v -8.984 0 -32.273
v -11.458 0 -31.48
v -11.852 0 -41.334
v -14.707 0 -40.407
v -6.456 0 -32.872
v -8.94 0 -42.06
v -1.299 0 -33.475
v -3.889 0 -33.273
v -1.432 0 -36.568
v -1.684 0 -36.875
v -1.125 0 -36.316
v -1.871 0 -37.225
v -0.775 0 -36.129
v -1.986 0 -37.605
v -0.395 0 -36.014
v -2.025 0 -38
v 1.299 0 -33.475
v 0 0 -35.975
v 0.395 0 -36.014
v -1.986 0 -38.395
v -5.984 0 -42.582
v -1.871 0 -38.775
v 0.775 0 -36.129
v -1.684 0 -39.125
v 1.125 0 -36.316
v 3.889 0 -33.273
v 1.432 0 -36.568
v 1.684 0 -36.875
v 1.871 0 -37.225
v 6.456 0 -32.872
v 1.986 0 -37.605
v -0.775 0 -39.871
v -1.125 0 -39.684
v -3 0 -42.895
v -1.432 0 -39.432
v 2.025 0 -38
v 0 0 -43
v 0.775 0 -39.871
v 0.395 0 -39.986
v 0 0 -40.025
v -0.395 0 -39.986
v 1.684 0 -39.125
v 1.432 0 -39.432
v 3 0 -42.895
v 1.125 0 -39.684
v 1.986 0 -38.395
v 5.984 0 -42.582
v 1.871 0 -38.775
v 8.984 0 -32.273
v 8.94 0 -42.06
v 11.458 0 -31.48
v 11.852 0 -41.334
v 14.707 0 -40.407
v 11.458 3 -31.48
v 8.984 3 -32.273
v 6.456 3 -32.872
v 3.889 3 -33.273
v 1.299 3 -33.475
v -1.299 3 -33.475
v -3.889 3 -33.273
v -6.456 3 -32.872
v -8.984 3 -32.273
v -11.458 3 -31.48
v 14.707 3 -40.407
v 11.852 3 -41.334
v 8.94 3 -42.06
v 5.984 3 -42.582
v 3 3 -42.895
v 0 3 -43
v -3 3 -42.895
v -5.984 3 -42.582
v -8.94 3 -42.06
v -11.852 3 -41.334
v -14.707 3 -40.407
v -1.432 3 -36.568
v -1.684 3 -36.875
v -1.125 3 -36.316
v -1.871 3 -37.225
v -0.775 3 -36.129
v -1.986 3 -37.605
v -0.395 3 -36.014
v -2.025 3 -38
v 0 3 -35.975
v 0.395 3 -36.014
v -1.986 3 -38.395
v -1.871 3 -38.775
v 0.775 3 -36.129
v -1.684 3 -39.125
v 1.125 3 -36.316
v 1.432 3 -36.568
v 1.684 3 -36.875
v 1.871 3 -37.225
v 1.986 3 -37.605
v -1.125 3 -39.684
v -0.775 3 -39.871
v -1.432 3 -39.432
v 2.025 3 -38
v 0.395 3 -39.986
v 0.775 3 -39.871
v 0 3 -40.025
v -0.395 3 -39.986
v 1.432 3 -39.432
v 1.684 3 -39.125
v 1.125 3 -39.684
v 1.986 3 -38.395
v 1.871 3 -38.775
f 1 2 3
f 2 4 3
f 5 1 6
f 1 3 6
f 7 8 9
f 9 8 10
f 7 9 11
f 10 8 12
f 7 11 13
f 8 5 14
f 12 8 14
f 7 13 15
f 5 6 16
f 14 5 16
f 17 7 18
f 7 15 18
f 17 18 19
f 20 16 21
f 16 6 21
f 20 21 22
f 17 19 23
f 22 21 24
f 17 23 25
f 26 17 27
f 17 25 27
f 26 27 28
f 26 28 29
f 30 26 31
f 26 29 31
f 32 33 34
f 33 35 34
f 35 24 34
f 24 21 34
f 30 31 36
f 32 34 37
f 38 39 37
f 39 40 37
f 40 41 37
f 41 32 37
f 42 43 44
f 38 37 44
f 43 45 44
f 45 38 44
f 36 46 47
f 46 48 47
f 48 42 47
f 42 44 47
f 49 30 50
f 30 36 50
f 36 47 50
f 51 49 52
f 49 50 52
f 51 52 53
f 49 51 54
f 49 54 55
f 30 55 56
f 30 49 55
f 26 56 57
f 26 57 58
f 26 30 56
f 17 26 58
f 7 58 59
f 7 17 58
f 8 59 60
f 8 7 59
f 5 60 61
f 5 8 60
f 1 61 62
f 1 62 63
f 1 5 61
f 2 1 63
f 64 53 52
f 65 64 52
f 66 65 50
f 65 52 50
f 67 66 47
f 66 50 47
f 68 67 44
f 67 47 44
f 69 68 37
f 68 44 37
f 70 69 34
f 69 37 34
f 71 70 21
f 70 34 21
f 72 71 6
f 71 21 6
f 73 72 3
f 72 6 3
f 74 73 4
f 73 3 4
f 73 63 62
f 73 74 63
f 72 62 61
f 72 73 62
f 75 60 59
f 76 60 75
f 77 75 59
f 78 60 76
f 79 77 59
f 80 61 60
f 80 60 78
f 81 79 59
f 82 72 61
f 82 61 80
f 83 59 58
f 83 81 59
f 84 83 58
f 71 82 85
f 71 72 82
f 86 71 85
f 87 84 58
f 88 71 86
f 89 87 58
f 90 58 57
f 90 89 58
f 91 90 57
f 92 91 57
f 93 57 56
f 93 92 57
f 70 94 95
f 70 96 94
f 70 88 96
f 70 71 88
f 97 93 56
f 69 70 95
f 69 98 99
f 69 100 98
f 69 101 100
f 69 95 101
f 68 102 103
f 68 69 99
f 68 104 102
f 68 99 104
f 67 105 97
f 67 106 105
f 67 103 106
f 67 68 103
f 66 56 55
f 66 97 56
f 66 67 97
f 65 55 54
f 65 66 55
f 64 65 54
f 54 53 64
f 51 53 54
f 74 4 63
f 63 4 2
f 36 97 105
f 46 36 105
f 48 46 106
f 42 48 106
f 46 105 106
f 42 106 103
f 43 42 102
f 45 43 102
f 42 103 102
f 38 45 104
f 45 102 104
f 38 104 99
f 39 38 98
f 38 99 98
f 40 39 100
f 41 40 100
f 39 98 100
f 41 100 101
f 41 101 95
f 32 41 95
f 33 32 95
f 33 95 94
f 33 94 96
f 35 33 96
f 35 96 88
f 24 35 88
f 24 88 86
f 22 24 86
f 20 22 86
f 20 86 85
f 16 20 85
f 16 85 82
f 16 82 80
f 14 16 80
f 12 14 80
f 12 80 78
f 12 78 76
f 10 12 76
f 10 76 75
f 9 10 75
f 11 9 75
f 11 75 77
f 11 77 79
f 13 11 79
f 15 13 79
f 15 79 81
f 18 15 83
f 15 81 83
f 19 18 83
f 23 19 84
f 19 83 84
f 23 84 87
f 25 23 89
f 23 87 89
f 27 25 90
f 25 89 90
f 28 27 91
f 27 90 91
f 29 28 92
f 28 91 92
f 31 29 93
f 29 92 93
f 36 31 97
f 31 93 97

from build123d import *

# Parameters (mm, degrees)
SKETCH1_R               = 43
SKETCH1_R_2             = 33.5
BOSS_EXTRUDE1_DEPTH     = 3
CUT_EXTRUDE1_START      = -4
CUT_EXTRUDE1_DEPTH      = 5
SKETCH3_R               = 2.025
CUT_EXTRUDE2_DEPTH      = 1
CUT_EXTRUDE2_DEPTH_BACK = 4


with BuildPart() as part:
    # Sketch1 → Boss-Extrude1 (new body)
    with BuildSketch(Plane(origin=(0, 0, 0), x_dir=(1, 0, 0), z_dir=(0, 1, 0))):
        Circle(SKETCH1_R)
        Circle(SKETCH1_R_2, mode=Mode.SUBTRACT)
    extrude(amount=BOSS_EXTRUDE1_DEPTH)

    # Sketch2 → Cut-Extrude1 (cut)
    with BuildSketch(Plane(origin=(0, 3, 0), x_dir=(1, 0, 0), z_dir=(0, 1, 0)).offset(CUT_EXTRUDE1_START)):
        with BuildLine():
            Line((0, 0), (0, -52.31984462))
            ThreePointArc((0, -52.31984462), (51.524988618, -9.085245674), (17.894440756, 49.16457191))
            Line((17.894440756, 49.16457191), (0, 0))
        make_face()
    cut_extrude1 = extrude(amount=CUT_EXTRUDE1_DEPTH, mode=Mode.SUBTRACT)

    # Mirror1: Cut-Extrude1 across plane
    add(cut_extrude1.mirror(Plane(origin=(0, 0, 0), x_dir=(0, 0, 1), z_dir=(1, 0, 0))), mode=Mode.SUBTRACT)

    # Sketch3 → Cut-Extrude2 (cut, two sides)
    with BuildSketch(Plane(origin=(0, 3, 0), x_dir=(1, 0, 0), z_dir=(0, 1, 0))) as cut_extrude2_sk:
        with Locations((0, 38)):
            Circle(SKETCH3_R)
    extrude(amount=CUT_EXTRUDE2_DEPTH, mode=Mode.SUBTRACT)
    extrude(cut_extrude2_sk.sketch, amount=-CUT_EXTRUDE2_DEPTH_BACK, mode=Mode.SUBTRACT)


solid = part.part
